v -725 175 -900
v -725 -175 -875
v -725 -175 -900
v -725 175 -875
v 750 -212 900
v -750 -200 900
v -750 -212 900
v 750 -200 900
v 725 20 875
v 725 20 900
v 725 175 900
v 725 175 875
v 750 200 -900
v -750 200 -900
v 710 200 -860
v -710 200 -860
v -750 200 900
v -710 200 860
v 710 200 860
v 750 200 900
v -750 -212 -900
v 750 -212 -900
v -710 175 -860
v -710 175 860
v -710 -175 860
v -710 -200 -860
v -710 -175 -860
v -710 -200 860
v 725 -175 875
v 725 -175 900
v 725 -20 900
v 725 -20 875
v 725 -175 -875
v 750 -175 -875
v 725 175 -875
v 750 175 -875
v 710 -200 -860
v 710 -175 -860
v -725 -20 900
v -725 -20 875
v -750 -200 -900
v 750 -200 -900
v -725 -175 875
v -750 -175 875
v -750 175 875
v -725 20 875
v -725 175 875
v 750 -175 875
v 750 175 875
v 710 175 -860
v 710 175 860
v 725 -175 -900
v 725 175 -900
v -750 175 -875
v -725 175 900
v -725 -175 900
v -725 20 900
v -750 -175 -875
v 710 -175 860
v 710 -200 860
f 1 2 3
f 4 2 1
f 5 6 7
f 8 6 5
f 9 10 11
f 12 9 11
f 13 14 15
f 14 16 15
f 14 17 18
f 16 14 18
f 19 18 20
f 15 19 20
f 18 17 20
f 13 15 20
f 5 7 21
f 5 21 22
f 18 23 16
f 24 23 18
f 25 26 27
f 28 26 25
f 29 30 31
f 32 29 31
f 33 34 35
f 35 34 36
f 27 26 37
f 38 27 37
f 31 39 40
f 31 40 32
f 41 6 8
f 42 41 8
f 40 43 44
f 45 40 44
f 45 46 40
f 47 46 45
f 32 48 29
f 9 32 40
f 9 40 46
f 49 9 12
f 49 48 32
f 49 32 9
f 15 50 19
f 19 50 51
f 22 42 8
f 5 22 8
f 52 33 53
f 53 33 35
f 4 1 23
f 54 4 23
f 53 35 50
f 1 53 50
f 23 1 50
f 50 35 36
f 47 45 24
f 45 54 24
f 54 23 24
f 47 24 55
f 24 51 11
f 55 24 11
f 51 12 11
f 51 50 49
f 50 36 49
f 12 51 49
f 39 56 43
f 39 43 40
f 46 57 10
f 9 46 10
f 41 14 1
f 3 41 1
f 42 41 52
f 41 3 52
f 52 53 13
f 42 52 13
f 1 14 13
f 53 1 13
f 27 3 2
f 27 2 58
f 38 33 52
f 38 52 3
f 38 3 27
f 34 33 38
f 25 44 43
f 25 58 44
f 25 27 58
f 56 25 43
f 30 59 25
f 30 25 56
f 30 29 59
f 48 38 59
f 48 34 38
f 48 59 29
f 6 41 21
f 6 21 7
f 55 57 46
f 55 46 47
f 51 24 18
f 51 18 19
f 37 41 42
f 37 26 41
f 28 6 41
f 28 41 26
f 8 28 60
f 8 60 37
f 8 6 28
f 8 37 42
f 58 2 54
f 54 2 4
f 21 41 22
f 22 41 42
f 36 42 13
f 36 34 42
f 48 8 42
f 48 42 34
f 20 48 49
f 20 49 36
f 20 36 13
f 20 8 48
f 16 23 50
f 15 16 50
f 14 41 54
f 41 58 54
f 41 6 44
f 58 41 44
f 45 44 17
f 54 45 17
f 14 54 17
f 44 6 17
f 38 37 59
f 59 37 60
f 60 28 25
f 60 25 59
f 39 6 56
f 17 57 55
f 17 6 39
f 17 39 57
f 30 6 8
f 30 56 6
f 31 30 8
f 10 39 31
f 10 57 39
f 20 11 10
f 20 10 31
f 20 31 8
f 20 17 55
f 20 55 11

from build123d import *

# Parameters (mm, degrees)
F0_W      = 1500
F0_H      = 400
F1_DEPTH  = 900
F2_W      = 1420
F2_H      = 1720
F3_DEPTH  = 400.001
F4_W      = 350
F4_H      = 1750
F5_DEPTH  = 1500.001
F6_W      = 1450
F6_H      = 350
F7_DEPTH  = 1800.001
F8_W      = 1450
F8_H      = 40
F9_DEPTH  = 25
F11_W     = 1500
F11_H     = 1800
F12_DEPTH = 12


with BuildPart() as f1:
    # F0 (on Top) → F1 (new body, symmetric)
    with BuildSketch(Plane.XY):
        Rectangle(F0_W, F0_H)
    extrude(amount=F1_DEPTH, both=True)

    # F2 (on face) → F3 (cut, through all)
    with BuildSketch(Plane.XZ.offset(200)):
        Rectangle(F2_W, F2_H)
    extrude(amount=-F3_DEPTH, mode=Mode.SUBTRACT)

    # F4 (on face) → F5 (cut, through all)
    with BuildSketch(Plane.YZ.offset(750)):
        Rectangle(F4_W, F4_H)
    extrude(amount=-F5_DEPTH, mode=Mode.SUBTRACT)

    # F6 (on face) → F7 (cut, through all)
    with BuildSketch(Plane.XY.offset(900)):
        Rectangle(F6_W, F6_H)
    extrude(amount=-F7_DEPTH, mode=Mode.SUBTRACT)

    # F8 (on face) → F9 (join)
    with BuildSketch(Plane.XY.offset(900)):
        Rectangle(F8_W, F8_H)
    extrude(amount=-F9_DEPTH)


with BuildPart() as f12:
    # F11 (on face) → F12 (new body)
    with BuildSketch(Plane.XZ.offset(200)):
        Rectangle(F11_W, F11_H)
    extrude(amount=F12_DEPTH)


solid = Compound([f1.part, f12.part])
